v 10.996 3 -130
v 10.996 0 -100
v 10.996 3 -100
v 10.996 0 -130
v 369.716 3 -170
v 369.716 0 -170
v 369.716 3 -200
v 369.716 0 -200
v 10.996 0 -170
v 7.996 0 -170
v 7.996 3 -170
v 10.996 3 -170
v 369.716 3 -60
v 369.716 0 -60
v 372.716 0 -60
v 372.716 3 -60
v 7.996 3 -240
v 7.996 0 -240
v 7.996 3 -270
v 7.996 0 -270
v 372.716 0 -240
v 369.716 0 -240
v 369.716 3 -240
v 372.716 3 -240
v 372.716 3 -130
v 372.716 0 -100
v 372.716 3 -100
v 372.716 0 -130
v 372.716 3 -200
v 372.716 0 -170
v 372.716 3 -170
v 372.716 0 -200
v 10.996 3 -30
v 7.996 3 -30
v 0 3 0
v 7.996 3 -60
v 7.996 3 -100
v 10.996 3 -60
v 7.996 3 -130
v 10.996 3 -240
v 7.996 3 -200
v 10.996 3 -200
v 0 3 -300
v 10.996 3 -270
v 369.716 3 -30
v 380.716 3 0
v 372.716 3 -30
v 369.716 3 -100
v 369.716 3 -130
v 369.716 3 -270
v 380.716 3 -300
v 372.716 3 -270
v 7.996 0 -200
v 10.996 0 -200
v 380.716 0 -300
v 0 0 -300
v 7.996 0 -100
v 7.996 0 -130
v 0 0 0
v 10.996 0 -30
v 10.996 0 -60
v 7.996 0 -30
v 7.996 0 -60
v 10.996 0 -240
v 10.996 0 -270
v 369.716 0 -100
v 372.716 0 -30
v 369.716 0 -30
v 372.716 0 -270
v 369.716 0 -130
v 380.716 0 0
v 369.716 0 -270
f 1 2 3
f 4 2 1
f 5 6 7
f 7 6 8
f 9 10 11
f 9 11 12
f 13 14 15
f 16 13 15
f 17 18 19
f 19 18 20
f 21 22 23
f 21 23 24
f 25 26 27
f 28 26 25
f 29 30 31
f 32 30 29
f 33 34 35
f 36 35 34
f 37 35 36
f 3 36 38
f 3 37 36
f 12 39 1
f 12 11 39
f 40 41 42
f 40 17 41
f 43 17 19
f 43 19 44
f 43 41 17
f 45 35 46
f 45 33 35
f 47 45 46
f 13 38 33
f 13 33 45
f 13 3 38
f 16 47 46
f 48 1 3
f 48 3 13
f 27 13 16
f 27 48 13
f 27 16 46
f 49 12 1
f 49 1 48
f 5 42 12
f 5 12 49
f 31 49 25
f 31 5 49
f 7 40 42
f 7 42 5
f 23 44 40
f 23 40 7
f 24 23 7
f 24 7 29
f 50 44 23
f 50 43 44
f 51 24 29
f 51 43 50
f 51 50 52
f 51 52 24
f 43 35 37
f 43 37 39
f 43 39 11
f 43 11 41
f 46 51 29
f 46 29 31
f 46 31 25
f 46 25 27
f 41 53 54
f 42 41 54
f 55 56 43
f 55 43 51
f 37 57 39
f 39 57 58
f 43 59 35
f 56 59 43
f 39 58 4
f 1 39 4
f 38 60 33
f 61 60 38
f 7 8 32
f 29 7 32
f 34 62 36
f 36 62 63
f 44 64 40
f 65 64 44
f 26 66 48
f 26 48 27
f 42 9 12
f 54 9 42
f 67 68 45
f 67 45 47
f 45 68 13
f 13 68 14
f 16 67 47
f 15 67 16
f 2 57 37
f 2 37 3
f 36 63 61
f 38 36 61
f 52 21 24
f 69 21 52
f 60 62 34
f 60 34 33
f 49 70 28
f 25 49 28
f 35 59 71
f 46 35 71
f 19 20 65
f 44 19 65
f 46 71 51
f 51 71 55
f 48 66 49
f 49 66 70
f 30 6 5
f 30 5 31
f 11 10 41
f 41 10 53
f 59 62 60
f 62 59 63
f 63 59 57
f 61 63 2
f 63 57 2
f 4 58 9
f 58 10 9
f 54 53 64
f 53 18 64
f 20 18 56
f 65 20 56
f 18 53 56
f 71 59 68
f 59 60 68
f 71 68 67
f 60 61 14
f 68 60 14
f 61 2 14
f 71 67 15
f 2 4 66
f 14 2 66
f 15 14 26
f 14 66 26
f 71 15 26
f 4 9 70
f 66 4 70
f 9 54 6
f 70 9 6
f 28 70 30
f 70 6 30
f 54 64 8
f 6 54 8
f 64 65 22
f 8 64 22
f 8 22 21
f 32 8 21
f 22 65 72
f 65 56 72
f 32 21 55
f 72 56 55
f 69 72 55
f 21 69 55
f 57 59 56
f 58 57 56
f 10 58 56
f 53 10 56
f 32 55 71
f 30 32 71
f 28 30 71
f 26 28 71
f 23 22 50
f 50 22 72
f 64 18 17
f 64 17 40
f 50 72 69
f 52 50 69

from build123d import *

# Parameters (mm, degrees)
SKETCH1_W           = 380.715714286
SKETCH1_H           = 300
SKETCH1_W_2         = 3
SKETCH1_H_2         = 30
BOSS_EXTRUDE1_DEPTH = 3


with BuildPart() as part:
    # Sketch1 → Boss-Extrude1 (new body)
    with BuildSketch(Plane(origin=(0, 0, 0), x_dir=(1, 0, 0), z_dir=(0, 1, 0))):
        with Locations((190.357857143, 150)):
            Rectangle(SKETCH1_W, SKETCH1_H)
        with Locations((9.495714286, 255)):
            Rectangle(SKETCH1_W_2, SKETCH1_H_2, mode=Mode.SUBTRACT)
        with Locations((9.495714286, 185)):
            Rectangle(SKETCH1_W_2, SKETCH1_H_2, mode=Mode.SUBTRACT)
        with Locations((9.495714286, 115)):
            Rectangle(SKETCH1_W_2, SKETCH1_H_2, mode=Mode.SUBTRACT)
        with Locations((9.495714286, 45)):
            Rectangle(SKETCH1_W_2, SKETCH1_H_2, mode=Mode.SUBTRACT)
        with Locations((371.215714286, 45)):
            Rectangle(SKETCH1_W_2, SKETCH1_H_2, mode=Mode.SUBTRACT)
        with Locations((371.215714286, 115)):
            Rectangle(SKETCH1_W_2, SKETCH1_H_2, mode=Mode.SUBTRACT)
        with Locations((371.215714286, 185)):
            Rectangle(SKETCH1_W_2, SKETCH1_H_2, mode=Mode.SUBTRACT)
        with Locations((371.215714286, 255)):
            Rectangle(SKETCH1_W_2, SKETCH1_H_2, mode=Mode.SUBTRACT)
    extrude(amount=BOSS_EXTRUDE1_DEPTH)


solid = part.part
